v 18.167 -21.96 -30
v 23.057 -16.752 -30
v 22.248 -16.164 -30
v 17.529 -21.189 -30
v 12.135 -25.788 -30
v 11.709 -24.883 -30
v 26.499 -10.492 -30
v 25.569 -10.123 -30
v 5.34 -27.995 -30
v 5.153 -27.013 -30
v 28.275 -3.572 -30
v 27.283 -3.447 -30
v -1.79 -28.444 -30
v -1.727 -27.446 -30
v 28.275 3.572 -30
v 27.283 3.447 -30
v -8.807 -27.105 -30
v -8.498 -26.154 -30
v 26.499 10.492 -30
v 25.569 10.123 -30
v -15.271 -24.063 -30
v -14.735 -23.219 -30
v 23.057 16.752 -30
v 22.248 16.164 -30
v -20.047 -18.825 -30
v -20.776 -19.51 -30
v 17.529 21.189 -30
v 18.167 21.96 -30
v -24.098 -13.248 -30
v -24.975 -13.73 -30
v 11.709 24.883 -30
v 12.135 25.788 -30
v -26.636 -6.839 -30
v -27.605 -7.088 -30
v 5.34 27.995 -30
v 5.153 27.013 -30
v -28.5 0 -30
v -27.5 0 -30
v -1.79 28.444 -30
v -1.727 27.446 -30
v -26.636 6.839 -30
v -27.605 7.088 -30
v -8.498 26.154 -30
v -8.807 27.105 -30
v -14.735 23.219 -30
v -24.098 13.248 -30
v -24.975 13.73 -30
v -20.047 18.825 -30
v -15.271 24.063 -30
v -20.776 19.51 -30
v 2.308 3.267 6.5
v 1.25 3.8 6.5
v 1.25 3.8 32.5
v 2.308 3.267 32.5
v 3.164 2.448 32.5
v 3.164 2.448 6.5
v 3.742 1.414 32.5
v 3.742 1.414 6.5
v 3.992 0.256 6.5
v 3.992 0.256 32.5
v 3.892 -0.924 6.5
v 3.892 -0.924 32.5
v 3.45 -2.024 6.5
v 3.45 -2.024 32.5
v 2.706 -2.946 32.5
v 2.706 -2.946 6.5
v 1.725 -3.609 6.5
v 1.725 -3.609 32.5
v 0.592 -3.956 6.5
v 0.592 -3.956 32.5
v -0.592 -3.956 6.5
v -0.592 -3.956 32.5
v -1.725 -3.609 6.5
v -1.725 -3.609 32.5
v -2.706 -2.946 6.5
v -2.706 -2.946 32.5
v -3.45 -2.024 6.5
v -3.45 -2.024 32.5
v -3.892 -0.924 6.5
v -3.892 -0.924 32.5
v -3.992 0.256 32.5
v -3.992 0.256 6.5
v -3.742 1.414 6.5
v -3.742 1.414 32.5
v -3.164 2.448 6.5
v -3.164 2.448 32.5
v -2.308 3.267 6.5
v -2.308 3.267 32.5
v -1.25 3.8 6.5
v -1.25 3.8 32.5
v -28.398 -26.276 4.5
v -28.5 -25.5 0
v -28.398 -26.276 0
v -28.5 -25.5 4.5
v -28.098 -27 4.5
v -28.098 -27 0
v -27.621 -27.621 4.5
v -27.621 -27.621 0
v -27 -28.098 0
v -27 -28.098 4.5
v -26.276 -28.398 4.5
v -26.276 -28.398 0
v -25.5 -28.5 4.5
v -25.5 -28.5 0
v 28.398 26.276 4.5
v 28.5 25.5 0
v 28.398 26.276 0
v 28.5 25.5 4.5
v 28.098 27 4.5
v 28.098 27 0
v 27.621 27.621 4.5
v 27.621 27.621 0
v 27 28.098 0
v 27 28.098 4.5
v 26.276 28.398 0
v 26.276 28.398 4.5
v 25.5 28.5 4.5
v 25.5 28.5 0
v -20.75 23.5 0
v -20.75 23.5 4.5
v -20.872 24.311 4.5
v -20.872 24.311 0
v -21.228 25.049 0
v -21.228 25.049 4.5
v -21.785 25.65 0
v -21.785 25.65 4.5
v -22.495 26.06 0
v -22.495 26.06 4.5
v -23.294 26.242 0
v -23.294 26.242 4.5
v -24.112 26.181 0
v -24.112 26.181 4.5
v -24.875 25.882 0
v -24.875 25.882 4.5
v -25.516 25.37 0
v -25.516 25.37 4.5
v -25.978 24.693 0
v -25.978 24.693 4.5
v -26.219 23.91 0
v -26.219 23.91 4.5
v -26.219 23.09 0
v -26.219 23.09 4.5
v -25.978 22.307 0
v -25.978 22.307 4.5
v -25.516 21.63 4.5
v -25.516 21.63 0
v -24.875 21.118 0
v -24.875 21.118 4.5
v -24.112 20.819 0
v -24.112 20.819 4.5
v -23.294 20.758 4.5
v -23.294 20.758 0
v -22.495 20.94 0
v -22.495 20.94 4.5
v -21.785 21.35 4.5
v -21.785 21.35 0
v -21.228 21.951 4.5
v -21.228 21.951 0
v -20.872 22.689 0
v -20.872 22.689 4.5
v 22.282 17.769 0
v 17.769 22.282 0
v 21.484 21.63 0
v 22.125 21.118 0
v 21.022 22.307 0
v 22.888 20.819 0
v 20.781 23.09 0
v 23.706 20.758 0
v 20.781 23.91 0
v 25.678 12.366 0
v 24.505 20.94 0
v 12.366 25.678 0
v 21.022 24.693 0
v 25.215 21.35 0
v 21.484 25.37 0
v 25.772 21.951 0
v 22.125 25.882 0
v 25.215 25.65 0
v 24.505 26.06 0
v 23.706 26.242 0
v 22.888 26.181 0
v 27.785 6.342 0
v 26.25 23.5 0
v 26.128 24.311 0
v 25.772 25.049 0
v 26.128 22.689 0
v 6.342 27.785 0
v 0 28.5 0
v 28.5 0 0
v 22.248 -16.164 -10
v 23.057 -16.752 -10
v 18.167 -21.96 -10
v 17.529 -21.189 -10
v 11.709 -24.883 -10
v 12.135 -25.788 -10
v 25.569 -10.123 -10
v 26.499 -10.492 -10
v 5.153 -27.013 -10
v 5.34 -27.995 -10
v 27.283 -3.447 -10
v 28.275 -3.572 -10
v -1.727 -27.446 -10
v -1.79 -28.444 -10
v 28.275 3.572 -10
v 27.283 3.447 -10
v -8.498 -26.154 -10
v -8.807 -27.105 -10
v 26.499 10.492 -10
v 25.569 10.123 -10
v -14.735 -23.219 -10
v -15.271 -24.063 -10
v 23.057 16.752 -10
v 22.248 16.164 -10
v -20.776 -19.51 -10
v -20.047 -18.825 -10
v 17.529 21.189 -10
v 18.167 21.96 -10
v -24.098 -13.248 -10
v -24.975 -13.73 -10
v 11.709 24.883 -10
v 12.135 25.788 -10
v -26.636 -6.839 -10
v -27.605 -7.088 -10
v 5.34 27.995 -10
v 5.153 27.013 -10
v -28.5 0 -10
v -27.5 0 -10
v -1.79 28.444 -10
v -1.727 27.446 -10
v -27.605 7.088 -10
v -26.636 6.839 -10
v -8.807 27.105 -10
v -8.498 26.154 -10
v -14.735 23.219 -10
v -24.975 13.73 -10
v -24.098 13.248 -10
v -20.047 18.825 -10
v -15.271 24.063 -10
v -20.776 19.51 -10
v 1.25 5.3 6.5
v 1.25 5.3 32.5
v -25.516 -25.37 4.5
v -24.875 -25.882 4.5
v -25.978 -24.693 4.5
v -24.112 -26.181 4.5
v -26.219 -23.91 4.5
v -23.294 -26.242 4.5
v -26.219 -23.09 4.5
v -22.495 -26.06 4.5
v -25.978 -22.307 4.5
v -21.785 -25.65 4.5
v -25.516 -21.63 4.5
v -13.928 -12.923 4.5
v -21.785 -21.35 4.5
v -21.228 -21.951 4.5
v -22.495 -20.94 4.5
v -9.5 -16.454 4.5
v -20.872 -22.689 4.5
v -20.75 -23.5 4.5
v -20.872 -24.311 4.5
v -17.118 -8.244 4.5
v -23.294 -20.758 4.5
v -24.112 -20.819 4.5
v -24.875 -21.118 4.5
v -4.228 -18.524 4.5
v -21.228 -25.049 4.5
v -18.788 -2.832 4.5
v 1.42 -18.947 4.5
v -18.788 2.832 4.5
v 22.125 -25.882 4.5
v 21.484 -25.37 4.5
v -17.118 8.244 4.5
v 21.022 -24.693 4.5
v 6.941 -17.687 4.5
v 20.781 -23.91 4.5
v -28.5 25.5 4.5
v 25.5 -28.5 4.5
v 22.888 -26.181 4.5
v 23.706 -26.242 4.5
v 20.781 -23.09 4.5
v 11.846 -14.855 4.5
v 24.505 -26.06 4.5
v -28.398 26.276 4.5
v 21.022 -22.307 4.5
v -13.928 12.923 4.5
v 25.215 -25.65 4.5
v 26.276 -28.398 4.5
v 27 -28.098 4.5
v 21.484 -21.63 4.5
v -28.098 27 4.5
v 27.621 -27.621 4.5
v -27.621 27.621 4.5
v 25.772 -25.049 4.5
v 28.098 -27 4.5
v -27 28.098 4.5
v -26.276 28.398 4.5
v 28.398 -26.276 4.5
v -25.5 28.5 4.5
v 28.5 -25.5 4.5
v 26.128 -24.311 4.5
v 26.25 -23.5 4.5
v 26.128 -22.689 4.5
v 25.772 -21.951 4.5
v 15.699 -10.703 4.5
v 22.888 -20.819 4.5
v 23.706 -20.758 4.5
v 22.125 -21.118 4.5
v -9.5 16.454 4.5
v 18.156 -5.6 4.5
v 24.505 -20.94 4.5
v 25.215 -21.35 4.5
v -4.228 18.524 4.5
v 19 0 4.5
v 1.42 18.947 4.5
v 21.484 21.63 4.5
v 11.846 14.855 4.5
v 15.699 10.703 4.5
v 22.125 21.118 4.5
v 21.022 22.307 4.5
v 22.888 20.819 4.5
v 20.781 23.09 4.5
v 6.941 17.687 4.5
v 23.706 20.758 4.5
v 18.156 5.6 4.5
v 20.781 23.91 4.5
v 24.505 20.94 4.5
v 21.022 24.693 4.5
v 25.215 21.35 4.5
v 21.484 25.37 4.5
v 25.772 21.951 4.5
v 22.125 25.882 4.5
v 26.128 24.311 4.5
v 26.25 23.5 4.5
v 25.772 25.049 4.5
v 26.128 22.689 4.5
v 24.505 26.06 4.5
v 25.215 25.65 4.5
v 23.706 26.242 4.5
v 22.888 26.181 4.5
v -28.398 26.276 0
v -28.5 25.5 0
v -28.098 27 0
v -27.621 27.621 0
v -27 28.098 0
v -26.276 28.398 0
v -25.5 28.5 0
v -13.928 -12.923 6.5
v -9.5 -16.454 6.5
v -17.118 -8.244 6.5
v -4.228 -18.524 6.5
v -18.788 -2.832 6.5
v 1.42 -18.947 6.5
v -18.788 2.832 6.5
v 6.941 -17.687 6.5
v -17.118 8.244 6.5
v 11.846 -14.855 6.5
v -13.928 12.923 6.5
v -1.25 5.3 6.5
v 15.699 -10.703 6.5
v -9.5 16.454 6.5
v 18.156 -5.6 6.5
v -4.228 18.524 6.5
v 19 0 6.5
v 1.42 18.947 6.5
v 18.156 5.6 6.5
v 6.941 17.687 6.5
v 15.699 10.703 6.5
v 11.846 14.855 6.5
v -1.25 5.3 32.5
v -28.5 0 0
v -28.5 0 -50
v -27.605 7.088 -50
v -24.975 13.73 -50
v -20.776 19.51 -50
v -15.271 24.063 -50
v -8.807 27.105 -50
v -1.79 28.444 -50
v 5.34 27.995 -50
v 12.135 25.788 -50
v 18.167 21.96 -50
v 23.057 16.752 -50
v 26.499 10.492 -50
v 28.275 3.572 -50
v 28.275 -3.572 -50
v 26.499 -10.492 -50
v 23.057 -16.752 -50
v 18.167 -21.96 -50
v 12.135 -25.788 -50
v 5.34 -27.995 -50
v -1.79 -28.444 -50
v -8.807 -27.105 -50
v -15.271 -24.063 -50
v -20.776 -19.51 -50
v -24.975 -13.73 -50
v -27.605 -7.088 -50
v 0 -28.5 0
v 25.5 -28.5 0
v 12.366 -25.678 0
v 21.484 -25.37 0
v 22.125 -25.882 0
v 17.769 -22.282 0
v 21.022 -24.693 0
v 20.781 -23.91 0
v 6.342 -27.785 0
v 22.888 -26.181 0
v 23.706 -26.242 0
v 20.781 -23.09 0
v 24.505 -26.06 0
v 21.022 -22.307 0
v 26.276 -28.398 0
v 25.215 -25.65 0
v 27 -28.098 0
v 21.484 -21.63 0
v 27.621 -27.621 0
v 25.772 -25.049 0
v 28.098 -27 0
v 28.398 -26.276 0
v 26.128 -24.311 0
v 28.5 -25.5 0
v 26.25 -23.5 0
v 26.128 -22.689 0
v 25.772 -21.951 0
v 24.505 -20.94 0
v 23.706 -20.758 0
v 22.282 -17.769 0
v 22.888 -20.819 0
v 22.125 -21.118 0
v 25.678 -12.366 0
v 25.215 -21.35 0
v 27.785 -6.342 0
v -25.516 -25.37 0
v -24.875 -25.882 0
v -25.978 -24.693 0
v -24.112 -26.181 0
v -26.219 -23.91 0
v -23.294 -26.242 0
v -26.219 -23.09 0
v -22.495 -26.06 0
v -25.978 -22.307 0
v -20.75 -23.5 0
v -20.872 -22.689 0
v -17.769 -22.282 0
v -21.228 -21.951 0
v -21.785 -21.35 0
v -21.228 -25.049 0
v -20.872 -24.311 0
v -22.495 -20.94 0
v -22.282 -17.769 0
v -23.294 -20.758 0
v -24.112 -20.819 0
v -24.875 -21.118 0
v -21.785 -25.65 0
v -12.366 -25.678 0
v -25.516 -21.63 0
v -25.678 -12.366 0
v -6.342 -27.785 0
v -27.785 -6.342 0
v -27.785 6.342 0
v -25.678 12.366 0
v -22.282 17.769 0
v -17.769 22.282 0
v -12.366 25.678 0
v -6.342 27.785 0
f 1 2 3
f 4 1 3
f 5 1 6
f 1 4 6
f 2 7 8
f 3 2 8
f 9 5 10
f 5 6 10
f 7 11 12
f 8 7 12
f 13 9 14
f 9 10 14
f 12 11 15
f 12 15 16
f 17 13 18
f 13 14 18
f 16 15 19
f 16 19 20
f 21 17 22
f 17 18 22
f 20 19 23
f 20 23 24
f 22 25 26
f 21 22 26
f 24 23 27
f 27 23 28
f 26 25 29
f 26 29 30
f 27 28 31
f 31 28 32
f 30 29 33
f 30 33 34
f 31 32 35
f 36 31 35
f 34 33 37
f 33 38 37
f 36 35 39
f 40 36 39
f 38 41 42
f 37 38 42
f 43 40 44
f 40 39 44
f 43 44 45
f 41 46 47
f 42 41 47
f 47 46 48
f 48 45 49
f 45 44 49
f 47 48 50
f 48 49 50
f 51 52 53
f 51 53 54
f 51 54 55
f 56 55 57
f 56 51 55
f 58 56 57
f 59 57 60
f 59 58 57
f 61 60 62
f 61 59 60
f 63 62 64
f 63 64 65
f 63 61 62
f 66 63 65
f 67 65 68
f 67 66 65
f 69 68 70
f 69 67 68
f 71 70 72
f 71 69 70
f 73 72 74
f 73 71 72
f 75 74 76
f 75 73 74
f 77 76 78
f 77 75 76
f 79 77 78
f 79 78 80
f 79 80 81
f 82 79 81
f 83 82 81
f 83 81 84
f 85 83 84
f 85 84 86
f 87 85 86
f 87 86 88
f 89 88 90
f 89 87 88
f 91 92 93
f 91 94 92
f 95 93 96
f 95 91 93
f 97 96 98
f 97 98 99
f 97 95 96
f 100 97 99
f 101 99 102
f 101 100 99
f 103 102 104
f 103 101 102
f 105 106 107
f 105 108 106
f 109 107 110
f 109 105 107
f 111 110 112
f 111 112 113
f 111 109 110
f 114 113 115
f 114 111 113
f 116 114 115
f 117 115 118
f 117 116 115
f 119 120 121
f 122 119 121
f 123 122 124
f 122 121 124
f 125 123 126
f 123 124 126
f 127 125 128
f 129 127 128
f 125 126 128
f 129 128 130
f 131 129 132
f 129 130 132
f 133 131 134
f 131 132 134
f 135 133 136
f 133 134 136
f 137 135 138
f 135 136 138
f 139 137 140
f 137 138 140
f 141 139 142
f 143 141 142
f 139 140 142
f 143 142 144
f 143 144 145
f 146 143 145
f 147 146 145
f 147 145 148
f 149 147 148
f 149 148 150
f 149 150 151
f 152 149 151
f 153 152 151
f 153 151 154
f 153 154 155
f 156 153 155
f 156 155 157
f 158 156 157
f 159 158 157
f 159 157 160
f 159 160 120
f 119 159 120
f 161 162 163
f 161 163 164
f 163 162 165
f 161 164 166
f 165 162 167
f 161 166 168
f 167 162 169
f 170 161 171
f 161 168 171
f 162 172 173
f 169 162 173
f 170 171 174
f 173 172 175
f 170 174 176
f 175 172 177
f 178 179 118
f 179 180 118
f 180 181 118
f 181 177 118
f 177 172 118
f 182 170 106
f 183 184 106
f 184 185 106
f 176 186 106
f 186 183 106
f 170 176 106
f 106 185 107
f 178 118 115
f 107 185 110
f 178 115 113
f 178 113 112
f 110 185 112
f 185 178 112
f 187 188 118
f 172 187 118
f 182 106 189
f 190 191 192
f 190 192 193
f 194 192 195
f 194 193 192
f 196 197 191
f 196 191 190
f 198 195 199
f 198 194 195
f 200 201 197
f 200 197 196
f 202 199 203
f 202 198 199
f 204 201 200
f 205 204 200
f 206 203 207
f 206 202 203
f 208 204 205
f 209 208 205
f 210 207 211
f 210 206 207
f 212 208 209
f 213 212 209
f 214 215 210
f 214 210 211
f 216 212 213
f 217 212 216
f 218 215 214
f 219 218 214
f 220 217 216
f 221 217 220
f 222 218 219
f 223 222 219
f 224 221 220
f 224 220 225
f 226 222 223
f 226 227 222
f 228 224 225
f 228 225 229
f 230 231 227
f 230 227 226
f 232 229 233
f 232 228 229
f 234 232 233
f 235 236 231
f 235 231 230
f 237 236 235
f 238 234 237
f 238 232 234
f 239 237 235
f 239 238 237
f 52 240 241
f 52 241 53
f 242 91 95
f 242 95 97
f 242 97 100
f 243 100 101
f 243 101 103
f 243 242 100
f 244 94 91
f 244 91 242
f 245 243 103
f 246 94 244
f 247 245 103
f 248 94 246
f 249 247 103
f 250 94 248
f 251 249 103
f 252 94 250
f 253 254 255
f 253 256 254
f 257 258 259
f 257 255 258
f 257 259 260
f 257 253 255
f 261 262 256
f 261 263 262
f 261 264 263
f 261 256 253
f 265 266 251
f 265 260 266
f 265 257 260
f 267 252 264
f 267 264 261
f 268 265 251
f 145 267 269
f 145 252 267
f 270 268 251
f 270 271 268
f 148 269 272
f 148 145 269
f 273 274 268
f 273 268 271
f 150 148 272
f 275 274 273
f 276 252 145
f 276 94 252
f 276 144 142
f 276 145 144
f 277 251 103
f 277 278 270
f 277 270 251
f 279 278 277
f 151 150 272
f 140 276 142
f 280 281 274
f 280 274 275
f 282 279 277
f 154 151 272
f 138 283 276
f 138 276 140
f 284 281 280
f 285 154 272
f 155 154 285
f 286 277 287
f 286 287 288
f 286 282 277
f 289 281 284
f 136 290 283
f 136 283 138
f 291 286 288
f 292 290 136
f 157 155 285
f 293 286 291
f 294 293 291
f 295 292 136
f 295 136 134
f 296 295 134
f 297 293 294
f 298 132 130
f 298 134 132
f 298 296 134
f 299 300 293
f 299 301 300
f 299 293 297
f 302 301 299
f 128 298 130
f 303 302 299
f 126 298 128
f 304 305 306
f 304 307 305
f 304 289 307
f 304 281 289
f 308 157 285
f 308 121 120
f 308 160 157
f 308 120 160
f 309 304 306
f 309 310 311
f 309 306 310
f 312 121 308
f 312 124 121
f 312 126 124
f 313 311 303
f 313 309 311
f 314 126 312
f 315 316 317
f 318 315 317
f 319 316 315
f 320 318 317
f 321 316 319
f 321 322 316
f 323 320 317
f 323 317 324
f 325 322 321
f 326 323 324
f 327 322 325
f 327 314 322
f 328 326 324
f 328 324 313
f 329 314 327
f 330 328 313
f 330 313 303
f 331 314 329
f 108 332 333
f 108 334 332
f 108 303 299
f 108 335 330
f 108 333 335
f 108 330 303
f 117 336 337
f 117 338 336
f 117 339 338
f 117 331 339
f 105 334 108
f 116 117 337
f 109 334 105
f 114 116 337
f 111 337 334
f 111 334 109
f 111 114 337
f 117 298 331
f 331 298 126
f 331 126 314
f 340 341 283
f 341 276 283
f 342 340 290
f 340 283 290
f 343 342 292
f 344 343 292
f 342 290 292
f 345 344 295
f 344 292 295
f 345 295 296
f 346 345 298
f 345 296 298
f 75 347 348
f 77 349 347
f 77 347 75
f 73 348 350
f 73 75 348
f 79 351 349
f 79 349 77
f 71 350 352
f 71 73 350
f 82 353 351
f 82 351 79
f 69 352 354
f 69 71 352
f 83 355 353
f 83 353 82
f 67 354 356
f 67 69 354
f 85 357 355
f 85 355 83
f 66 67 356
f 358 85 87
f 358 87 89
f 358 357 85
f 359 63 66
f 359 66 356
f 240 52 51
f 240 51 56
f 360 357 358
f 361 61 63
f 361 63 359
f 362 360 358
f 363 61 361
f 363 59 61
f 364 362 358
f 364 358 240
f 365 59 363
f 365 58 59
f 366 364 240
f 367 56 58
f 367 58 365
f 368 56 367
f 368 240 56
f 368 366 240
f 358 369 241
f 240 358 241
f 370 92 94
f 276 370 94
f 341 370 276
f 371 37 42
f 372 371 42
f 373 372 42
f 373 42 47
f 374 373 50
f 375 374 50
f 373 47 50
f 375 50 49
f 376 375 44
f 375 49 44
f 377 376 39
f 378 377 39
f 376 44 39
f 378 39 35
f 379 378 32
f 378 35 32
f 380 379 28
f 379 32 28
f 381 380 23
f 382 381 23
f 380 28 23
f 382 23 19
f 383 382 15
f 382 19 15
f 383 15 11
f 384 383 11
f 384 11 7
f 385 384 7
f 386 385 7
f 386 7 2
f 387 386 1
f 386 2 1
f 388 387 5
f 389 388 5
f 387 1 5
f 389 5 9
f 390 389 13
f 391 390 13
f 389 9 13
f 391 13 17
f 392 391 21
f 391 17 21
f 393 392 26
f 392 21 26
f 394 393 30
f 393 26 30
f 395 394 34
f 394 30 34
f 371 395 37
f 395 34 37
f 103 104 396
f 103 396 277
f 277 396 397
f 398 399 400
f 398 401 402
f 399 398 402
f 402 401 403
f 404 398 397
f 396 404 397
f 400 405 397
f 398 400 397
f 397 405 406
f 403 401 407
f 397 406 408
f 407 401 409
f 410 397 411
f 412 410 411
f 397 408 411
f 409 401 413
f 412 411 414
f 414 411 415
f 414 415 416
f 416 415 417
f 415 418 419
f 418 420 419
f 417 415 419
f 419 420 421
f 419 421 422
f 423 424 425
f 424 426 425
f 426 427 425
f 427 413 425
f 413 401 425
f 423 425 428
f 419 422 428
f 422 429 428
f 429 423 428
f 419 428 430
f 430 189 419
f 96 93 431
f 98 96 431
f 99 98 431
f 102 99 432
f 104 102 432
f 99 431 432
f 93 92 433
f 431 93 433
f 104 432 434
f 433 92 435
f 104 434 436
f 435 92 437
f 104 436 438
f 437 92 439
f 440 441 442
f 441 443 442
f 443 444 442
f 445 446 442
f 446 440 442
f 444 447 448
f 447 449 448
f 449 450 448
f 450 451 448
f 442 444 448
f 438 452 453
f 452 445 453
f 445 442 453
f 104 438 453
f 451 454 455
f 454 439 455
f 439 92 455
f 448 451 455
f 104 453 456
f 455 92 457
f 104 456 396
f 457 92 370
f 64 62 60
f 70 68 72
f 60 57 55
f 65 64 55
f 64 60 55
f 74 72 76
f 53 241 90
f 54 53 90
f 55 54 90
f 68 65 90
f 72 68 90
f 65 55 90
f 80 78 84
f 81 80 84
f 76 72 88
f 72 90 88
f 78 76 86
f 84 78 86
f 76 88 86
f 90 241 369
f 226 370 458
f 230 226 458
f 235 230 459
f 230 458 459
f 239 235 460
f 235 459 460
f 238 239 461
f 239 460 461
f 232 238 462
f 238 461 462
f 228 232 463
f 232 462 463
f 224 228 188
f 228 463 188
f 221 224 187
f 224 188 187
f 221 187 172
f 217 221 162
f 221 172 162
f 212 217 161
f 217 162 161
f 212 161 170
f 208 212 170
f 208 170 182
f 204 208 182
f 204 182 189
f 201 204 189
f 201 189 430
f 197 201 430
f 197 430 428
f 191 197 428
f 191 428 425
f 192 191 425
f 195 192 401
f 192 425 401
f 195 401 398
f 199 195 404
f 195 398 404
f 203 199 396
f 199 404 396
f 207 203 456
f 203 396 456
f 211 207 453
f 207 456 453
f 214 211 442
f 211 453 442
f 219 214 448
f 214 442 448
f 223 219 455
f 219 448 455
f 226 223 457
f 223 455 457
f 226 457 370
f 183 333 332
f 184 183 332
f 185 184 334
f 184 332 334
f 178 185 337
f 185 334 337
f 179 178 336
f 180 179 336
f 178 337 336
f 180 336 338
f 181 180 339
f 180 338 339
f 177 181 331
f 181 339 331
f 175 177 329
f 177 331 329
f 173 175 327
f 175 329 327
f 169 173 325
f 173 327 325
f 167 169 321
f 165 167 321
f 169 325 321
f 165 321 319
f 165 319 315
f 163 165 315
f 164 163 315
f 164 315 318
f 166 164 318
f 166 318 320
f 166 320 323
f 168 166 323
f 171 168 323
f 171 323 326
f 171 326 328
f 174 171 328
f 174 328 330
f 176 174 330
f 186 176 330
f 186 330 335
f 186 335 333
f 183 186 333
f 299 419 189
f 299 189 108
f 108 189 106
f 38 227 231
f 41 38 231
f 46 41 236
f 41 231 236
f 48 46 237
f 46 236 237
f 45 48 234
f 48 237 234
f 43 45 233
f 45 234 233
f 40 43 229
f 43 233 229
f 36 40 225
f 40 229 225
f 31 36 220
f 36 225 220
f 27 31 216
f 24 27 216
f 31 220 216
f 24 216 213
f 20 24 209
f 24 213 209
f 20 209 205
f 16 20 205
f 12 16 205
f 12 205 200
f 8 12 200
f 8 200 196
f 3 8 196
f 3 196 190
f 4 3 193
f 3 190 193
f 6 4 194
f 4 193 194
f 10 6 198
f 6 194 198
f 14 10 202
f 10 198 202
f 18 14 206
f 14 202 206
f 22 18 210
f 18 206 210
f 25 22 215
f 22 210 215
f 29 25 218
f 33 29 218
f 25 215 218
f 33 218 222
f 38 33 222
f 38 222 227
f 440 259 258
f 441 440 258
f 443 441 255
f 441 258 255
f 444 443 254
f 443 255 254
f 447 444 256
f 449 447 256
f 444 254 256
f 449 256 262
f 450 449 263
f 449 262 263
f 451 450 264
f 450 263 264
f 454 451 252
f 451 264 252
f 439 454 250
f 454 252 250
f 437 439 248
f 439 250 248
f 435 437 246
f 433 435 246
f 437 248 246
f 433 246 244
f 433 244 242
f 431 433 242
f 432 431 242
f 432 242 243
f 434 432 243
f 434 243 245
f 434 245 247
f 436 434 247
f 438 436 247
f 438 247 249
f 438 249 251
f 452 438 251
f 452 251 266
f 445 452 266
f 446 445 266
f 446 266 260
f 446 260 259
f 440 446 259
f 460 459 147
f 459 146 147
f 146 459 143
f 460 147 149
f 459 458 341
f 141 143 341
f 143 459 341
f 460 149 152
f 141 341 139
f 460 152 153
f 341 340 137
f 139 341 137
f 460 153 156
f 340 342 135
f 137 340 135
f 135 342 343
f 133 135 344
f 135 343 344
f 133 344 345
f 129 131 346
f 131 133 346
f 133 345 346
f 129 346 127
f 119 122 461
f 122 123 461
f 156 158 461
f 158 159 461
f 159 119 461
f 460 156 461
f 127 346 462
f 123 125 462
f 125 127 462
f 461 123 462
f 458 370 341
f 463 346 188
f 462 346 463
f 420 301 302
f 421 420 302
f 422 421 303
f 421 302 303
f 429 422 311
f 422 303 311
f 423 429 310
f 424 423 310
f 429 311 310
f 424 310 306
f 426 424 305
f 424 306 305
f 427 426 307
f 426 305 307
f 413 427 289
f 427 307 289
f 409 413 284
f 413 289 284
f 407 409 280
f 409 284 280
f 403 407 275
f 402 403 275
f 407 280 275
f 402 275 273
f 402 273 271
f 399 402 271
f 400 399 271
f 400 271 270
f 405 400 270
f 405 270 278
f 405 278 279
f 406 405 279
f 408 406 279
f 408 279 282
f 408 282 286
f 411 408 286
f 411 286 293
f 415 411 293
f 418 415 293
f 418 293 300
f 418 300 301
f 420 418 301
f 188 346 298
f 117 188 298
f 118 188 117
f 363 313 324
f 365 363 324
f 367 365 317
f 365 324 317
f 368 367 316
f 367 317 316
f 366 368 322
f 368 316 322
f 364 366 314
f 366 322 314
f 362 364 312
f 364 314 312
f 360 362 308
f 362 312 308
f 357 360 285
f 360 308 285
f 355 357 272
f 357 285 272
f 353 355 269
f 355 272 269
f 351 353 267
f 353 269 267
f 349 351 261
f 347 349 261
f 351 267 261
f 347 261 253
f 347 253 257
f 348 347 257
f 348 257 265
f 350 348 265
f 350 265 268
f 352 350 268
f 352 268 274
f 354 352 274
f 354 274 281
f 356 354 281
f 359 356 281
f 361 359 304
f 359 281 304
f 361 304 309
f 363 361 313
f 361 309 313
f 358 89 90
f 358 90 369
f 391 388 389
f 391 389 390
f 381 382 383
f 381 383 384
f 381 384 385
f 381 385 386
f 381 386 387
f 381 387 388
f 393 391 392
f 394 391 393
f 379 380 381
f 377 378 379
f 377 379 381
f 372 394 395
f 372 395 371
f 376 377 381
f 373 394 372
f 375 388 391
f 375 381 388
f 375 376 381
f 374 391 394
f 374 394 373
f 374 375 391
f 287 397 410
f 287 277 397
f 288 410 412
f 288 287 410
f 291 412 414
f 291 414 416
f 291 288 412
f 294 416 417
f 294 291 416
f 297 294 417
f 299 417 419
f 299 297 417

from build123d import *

# Parameters (mm, degrees)
SKETCH_1_W          = 57
SKETCH_1_H          = 57
EXTRUDE_1_DEPTH     = 4.5
FILLET_1_R          = 3
SKETCH_2_R          = 19
EXTRUDE_2_DEPTH     = 2
EXTRUDE_3_DEPTH     = 26
SKETCH_4_R          = 2.75
CUT_EXTRUDE_1_DEPTH = 15
SKETCH_5_R          = 28.5
EXTRUDE_4_DEPTH     = 10
SKETCH_6_R          = 27.5
EXTRUDE_5_DEPTH     = 20
SKETCH_7_R          = 28.5
EXTRUDE_6_DEPTH     = 20


with BuildPart() as part:
    # 草图1 → 凸台-拉伸1 (new body)
    with BuildSketch(Plane.XY):
        Rectangle(SKETCH_1_W, SKETCH_1_H)
    extrude(amount=EXTRUDE_1_DEPTH)

    # 圆角1
    fillet_1_edges = [part.edges().sort_by_distance(p)[0] for p in [
        (28.5, -28.5, 2.25),
        (-28.5, -28.5, 2.25),
        (-28.5, 28.5, 2.25),
        (28.5, 28.5, 2.25),
    ]]
    fillet(fillet_1_edges, radius=FILLET_1_R)

    # 草图2 → 凸台-拉伸2 (add)
    with BuildSketch(Plane.XY.offset(4.5)):
        Circle(SKETCH_2_R)
    extrude(amount=EXTRUDE_2_DEPTH)

    # 草图3 → 凸台-拉伸3 (add)
    with BuildSketch(Plane.XY.offset(6.5)):
        with BuildLine():
            Line((-1.25, 3.799671038), (-1.25, 5.299671038))
            Line((-1.25, 5.299671038), (1.25, 5.299671038))
            Line((1.25, 5.299671038), (1.25, 3.799671038))
            ThreePointArc((1.25, 3.799671038), (0, -4), (-1.25, 3.799671038))
        make_face()
    extrude(amount=EXTRUDE_3_DEPTH)

    # 草图4 → 切除-拉伸1 (cut)
    with BuildSketch(Plane.XY.offset(4.5)):
        with Locations((-23.5, 23.5)):
            Circle(SKETCH_4_R)
        with Locations((23.5, 23.5)):
            Circle(SKETCH_4_R)
        with Locations((-23.5, -23.5)):
            Circle(SKETCH_4_R)
        with Locations((23.5, -23.5)):
            Circle(SKETCH_4_R)
    extrude(amount=-CUT_EXTRUDE_1_DEPTH, mode=Mode.SUBTRACT)

    # 草图5 → 凸台-拉伸4 (add)
    with BuildSketch(Plane(origin=(0, 0, 0), x_dir=(-1, 0, 0), z_dir=(0, 0, -1))):
        Circle(SKETCH_5_R)
    extrude(amount=EXTRUDE_4_DEPTH)

    # 草图6 → 凸台-拉伸5 (add)
    with BuildSketch(Plane(origin=(0, 0, -10), x_dir=(-1, 0, 0), z_dir=(0, 0, -1))):
        Circle(SKETCH_6_R)
    extrude(amount=EXTRUDE_5_DEPTH)

    # 草图7 → 凸台-拉伸6 (add)
    with BuildSketch(Plane(origin=(0, 0, -30), x_dir=(-1, 0, 0), z_dir=(0, 0, -1))):
        Circle(SKETCH_7_R)
    extrude(amount=EXTRUDE_6_DEPTH)


solid = part.part
